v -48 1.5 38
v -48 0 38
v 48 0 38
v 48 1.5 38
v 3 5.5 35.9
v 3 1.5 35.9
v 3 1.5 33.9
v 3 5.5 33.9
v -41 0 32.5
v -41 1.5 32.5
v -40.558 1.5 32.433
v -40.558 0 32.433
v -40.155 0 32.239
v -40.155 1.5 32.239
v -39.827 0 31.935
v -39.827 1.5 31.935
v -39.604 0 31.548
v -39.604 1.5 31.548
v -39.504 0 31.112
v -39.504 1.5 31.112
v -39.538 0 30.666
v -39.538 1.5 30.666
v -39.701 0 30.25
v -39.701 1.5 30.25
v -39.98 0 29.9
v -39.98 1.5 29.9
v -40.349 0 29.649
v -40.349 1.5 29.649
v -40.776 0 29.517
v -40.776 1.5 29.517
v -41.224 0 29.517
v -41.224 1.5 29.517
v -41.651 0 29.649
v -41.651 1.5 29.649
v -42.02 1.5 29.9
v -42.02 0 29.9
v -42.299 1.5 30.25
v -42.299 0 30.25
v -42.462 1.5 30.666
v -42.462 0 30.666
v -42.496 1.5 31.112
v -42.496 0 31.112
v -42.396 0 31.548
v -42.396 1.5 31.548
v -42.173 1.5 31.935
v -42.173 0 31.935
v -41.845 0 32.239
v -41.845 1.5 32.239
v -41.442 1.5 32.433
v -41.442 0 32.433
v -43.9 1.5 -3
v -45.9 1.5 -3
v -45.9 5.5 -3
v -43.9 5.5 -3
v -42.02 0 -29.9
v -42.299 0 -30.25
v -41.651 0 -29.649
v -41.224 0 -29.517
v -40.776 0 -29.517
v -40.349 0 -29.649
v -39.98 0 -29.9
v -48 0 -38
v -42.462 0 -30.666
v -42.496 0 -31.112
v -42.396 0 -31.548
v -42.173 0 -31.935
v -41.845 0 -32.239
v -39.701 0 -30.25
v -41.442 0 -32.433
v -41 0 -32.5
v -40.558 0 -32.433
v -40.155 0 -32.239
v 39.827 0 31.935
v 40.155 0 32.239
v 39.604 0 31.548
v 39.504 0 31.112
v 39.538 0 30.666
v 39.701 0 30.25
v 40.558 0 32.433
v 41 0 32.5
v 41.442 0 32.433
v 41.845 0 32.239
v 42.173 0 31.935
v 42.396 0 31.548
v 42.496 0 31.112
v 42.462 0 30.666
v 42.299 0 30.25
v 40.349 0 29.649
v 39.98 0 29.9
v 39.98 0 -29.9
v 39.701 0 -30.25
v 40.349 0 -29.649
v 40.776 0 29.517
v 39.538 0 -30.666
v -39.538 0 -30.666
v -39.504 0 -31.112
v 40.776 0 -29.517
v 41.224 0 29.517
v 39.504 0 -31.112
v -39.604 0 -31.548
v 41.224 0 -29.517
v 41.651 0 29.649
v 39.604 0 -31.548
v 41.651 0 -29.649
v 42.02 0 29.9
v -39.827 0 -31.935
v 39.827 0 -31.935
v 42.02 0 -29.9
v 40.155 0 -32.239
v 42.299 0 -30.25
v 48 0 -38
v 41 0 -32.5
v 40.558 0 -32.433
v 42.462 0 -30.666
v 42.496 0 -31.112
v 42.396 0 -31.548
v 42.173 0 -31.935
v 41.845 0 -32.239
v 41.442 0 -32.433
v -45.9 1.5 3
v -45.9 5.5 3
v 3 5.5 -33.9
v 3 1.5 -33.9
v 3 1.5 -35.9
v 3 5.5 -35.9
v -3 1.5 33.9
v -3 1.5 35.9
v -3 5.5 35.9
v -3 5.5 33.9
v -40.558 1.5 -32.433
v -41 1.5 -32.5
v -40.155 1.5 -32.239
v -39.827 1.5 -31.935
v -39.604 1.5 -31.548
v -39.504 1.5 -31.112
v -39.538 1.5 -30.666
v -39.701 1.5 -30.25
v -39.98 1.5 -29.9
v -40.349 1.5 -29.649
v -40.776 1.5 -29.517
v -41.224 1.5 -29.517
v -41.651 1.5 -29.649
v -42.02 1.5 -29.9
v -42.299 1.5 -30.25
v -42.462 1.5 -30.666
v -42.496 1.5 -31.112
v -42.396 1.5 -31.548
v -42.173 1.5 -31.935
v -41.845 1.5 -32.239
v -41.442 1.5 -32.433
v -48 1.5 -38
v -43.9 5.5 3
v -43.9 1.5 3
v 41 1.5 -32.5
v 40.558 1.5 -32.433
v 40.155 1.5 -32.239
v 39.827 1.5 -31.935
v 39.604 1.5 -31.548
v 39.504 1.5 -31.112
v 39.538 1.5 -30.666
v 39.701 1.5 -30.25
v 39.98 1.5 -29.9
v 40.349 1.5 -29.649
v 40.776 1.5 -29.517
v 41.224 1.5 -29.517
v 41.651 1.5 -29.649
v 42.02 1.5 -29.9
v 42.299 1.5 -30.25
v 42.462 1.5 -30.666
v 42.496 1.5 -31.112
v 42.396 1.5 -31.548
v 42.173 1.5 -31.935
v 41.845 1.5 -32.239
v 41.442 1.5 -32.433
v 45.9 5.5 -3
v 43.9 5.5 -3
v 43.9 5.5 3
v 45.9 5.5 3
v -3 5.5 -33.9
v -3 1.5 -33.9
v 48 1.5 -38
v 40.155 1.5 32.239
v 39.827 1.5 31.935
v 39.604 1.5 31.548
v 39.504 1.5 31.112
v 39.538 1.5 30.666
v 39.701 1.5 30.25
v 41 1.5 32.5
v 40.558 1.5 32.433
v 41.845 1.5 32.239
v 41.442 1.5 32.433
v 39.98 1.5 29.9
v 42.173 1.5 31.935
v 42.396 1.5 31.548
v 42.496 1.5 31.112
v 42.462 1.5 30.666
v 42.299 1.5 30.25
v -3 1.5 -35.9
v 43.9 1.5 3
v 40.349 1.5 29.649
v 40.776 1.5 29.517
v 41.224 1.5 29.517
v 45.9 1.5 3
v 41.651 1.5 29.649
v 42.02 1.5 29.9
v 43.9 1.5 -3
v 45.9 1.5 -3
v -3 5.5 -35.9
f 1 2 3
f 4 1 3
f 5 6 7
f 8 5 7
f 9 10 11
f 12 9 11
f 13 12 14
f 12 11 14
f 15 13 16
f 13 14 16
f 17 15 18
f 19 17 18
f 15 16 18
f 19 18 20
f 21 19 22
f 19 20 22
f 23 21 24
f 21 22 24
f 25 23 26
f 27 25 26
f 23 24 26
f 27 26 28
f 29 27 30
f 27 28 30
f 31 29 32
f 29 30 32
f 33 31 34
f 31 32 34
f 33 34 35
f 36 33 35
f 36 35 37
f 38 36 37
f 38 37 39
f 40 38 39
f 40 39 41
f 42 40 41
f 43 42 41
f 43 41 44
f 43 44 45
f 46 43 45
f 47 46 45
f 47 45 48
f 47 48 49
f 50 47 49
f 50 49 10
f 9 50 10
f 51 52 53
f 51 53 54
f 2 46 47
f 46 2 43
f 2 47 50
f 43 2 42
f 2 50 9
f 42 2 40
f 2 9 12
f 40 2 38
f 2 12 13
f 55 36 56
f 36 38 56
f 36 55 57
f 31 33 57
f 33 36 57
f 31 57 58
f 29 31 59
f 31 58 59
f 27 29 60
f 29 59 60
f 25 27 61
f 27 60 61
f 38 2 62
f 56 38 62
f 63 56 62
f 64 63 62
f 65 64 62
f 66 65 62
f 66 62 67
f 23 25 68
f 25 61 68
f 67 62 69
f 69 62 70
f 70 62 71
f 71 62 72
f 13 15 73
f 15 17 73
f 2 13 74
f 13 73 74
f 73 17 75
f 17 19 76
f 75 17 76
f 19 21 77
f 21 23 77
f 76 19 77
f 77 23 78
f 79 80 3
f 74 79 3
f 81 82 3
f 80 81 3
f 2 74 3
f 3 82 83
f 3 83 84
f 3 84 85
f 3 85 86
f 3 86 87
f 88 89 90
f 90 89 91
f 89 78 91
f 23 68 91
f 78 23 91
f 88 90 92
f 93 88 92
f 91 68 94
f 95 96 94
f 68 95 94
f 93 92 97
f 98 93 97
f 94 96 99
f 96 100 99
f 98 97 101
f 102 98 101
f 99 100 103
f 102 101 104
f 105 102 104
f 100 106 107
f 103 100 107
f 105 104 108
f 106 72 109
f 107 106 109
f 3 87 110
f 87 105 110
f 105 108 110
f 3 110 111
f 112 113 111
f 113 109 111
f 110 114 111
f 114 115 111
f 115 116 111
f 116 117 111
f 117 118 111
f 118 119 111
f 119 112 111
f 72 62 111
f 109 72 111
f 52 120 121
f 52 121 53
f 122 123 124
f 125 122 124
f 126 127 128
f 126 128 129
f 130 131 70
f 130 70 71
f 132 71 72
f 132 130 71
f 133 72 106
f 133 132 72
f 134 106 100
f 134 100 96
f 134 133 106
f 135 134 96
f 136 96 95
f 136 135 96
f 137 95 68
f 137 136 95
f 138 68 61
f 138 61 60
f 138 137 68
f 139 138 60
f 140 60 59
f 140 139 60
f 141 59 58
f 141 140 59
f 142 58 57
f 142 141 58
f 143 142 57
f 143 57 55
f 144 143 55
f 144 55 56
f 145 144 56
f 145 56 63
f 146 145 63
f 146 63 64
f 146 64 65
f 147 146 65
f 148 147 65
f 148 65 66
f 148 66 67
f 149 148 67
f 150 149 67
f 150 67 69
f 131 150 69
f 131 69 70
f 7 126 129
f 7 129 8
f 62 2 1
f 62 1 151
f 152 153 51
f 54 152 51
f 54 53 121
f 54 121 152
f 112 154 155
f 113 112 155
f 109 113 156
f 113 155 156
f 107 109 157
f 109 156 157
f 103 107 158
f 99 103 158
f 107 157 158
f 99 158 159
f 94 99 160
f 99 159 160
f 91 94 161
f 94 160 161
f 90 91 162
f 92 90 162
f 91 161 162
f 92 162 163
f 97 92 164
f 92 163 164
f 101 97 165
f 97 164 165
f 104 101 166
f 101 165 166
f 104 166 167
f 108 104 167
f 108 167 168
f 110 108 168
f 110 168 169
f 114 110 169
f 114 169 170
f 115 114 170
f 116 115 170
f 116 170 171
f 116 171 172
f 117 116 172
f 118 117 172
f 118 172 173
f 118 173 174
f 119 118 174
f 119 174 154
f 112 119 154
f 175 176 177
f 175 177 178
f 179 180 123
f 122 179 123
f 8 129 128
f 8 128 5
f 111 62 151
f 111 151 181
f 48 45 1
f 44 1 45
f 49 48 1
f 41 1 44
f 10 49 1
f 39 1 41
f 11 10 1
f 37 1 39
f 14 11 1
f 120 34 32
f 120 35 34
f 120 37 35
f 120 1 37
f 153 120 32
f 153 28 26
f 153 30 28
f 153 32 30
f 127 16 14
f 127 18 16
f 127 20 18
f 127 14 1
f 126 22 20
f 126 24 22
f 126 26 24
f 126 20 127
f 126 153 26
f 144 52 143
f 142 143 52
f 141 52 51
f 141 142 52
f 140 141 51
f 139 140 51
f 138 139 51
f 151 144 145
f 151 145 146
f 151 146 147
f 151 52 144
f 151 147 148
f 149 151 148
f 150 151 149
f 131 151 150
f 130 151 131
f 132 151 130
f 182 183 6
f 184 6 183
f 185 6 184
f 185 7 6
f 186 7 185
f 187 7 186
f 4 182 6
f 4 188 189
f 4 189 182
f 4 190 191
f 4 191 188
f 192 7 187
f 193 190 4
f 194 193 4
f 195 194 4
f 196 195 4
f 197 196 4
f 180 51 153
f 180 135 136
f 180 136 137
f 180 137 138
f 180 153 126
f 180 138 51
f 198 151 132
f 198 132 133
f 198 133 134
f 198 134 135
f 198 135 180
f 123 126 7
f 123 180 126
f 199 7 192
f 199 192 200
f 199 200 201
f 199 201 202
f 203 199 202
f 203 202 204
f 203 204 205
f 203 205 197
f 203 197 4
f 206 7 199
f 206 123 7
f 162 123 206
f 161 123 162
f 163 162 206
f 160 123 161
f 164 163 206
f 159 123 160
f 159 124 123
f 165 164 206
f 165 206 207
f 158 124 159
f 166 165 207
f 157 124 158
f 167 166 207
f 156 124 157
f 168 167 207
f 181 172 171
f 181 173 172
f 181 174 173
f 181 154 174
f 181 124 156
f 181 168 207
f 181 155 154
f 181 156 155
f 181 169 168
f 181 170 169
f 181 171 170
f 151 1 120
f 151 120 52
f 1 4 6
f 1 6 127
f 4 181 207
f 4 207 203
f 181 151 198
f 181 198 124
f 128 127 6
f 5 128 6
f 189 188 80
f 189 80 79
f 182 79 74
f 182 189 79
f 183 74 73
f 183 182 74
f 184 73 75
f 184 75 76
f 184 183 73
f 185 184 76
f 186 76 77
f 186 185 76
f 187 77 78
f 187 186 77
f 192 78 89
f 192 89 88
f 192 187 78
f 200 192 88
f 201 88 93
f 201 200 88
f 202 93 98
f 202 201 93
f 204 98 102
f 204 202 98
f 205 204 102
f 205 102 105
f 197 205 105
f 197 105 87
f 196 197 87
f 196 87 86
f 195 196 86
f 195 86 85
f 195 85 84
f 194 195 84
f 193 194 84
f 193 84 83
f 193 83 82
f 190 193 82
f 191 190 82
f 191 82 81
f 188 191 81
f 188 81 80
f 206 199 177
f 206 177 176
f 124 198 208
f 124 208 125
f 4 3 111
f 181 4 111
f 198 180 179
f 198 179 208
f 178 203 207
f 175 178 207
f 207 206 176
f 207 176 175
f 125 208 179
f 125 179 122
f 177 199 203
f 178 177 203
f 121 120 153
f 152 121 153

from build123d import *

# Parameters (mm, degrees)
SKETCH1_W               = 96
SKETCH1_H               = 76
BOSS_EXTRUDE1_DEPTH     = 1.5
SKETCH2_W               = 6
SKETCH2_H               = 2
SKETCH2_W_2             = 2
SKETCH2_H_2             = 6
BOSS_EXTRUDE2_DEPTH     = 4
CUT_EXTRUDE1_REACH      = 63.351
SKETCH3_R               = 1.5
MIRROR2_COPY_1_REACH    = 63.351
MIRROR2_COPY_1_SKETCH_R = 1.5


with BuildPart() as part:
    # Sketch1 → Boss-Extrude1 (new body)
    with BuildSketch(Plane(origin=(0, 0, 0), x_dir=(1, 0, 0), z_dir=(0, 1, 0))):
        Rectangle(SKETCH1_W, SKETCH1_H)
    extrude(amount=BOSS_EXTRUDE1_DEPTH)

    # Sketch2 → Boss-Extrude2 (add)
    with BuildSketch(Plane(origin=(0, 1.5, 0), x_dir=(1, 0, 0), z_dir=(0, 1, 0))):
        with Locations((0, 34.9)):
            Rectangle(SKETCH2_W, SKETCH2_H)
        with Locations((-44.9, 0)):
            Rectangle(SKETCH2_W_2, SKETCH2_H_2)
        with Locations((0, -34.9)):
            Rectangle(SKETCH2_W, SKETCH2_H)
        with Locations((44.9, 0)):
            Rectangle(SKETCH2_W_2, SKETCH2_H_2)
    extrude(amount=BOSS_EXTRUDE2_DEPTH)

    # Sketch3 → Cut-Extrude1 (cut, up to next)
    with BuildSketch(Plane(origin=(0, 1.5, 0), x_dir=(1, 0, 0), z_dir=(0, 1, 0)), mode=Mode.PRIVATE) as cut_extrude1_sk1:
        with Locations(Location((-41, -31, 0), (0, 0, 270))):
            Circle(SKETCH3_R)
    cut_extrude1_tool1 = extrude(cut_extrude1_sk1.sketch, amount=-CUT_EXTRUDE1_REACH, mode=Mode.PRIVATE) & part.part
    cut_extrude1 = cut_extrude1_tool1.solids().sort_by_distance((-41, 1.5, 31))[0]
    add(cut_extrude1, mode=Mode.SUBTRACT)

    # Mirror1: Cut-Extrude1 across plane
    add(cut_extrude1.mirror(Plane.XY), mode=Mode.SUBTRACT)

    # Mirror2: Cut-Extrude1 across plane
    add(cut_extrude1.mirror(Plane(origin=(0, 0, 0), x_dir=(0, 0, 1), z_dir=(1, 0, 0))), mode=Mode.SUBTRACT)

    # Mirror2 copy 1 sketch → Mirror2 copy 1 (cut, up to next)
    with BuildSketch(Plane(origin=(0, 1.5, 0), x_dir=(-1, 0, 0), z_dir=(0, 1, 0)), mode=Mode.PRIVATE) as mirror2_copy_1_sk1:
        with Locations(Location((-41, -31, 0), (0, 0, 270))):
            Circle(MIRROR2_COPY_1_SKETCH_R)
    mirror2_copy_1_tool1 = extrude(mirror2_copy_1_sk1.sketch, amount=-MIRROR2_COPY_1_REACH, mode=Mode.PRIVATE) & part.part
    add(mirror2_copy_1_tool1.solids().sort_by_distance((41, 1.5, -31))[0], mode=Mode.SUBTRACT)


solid = part.part
